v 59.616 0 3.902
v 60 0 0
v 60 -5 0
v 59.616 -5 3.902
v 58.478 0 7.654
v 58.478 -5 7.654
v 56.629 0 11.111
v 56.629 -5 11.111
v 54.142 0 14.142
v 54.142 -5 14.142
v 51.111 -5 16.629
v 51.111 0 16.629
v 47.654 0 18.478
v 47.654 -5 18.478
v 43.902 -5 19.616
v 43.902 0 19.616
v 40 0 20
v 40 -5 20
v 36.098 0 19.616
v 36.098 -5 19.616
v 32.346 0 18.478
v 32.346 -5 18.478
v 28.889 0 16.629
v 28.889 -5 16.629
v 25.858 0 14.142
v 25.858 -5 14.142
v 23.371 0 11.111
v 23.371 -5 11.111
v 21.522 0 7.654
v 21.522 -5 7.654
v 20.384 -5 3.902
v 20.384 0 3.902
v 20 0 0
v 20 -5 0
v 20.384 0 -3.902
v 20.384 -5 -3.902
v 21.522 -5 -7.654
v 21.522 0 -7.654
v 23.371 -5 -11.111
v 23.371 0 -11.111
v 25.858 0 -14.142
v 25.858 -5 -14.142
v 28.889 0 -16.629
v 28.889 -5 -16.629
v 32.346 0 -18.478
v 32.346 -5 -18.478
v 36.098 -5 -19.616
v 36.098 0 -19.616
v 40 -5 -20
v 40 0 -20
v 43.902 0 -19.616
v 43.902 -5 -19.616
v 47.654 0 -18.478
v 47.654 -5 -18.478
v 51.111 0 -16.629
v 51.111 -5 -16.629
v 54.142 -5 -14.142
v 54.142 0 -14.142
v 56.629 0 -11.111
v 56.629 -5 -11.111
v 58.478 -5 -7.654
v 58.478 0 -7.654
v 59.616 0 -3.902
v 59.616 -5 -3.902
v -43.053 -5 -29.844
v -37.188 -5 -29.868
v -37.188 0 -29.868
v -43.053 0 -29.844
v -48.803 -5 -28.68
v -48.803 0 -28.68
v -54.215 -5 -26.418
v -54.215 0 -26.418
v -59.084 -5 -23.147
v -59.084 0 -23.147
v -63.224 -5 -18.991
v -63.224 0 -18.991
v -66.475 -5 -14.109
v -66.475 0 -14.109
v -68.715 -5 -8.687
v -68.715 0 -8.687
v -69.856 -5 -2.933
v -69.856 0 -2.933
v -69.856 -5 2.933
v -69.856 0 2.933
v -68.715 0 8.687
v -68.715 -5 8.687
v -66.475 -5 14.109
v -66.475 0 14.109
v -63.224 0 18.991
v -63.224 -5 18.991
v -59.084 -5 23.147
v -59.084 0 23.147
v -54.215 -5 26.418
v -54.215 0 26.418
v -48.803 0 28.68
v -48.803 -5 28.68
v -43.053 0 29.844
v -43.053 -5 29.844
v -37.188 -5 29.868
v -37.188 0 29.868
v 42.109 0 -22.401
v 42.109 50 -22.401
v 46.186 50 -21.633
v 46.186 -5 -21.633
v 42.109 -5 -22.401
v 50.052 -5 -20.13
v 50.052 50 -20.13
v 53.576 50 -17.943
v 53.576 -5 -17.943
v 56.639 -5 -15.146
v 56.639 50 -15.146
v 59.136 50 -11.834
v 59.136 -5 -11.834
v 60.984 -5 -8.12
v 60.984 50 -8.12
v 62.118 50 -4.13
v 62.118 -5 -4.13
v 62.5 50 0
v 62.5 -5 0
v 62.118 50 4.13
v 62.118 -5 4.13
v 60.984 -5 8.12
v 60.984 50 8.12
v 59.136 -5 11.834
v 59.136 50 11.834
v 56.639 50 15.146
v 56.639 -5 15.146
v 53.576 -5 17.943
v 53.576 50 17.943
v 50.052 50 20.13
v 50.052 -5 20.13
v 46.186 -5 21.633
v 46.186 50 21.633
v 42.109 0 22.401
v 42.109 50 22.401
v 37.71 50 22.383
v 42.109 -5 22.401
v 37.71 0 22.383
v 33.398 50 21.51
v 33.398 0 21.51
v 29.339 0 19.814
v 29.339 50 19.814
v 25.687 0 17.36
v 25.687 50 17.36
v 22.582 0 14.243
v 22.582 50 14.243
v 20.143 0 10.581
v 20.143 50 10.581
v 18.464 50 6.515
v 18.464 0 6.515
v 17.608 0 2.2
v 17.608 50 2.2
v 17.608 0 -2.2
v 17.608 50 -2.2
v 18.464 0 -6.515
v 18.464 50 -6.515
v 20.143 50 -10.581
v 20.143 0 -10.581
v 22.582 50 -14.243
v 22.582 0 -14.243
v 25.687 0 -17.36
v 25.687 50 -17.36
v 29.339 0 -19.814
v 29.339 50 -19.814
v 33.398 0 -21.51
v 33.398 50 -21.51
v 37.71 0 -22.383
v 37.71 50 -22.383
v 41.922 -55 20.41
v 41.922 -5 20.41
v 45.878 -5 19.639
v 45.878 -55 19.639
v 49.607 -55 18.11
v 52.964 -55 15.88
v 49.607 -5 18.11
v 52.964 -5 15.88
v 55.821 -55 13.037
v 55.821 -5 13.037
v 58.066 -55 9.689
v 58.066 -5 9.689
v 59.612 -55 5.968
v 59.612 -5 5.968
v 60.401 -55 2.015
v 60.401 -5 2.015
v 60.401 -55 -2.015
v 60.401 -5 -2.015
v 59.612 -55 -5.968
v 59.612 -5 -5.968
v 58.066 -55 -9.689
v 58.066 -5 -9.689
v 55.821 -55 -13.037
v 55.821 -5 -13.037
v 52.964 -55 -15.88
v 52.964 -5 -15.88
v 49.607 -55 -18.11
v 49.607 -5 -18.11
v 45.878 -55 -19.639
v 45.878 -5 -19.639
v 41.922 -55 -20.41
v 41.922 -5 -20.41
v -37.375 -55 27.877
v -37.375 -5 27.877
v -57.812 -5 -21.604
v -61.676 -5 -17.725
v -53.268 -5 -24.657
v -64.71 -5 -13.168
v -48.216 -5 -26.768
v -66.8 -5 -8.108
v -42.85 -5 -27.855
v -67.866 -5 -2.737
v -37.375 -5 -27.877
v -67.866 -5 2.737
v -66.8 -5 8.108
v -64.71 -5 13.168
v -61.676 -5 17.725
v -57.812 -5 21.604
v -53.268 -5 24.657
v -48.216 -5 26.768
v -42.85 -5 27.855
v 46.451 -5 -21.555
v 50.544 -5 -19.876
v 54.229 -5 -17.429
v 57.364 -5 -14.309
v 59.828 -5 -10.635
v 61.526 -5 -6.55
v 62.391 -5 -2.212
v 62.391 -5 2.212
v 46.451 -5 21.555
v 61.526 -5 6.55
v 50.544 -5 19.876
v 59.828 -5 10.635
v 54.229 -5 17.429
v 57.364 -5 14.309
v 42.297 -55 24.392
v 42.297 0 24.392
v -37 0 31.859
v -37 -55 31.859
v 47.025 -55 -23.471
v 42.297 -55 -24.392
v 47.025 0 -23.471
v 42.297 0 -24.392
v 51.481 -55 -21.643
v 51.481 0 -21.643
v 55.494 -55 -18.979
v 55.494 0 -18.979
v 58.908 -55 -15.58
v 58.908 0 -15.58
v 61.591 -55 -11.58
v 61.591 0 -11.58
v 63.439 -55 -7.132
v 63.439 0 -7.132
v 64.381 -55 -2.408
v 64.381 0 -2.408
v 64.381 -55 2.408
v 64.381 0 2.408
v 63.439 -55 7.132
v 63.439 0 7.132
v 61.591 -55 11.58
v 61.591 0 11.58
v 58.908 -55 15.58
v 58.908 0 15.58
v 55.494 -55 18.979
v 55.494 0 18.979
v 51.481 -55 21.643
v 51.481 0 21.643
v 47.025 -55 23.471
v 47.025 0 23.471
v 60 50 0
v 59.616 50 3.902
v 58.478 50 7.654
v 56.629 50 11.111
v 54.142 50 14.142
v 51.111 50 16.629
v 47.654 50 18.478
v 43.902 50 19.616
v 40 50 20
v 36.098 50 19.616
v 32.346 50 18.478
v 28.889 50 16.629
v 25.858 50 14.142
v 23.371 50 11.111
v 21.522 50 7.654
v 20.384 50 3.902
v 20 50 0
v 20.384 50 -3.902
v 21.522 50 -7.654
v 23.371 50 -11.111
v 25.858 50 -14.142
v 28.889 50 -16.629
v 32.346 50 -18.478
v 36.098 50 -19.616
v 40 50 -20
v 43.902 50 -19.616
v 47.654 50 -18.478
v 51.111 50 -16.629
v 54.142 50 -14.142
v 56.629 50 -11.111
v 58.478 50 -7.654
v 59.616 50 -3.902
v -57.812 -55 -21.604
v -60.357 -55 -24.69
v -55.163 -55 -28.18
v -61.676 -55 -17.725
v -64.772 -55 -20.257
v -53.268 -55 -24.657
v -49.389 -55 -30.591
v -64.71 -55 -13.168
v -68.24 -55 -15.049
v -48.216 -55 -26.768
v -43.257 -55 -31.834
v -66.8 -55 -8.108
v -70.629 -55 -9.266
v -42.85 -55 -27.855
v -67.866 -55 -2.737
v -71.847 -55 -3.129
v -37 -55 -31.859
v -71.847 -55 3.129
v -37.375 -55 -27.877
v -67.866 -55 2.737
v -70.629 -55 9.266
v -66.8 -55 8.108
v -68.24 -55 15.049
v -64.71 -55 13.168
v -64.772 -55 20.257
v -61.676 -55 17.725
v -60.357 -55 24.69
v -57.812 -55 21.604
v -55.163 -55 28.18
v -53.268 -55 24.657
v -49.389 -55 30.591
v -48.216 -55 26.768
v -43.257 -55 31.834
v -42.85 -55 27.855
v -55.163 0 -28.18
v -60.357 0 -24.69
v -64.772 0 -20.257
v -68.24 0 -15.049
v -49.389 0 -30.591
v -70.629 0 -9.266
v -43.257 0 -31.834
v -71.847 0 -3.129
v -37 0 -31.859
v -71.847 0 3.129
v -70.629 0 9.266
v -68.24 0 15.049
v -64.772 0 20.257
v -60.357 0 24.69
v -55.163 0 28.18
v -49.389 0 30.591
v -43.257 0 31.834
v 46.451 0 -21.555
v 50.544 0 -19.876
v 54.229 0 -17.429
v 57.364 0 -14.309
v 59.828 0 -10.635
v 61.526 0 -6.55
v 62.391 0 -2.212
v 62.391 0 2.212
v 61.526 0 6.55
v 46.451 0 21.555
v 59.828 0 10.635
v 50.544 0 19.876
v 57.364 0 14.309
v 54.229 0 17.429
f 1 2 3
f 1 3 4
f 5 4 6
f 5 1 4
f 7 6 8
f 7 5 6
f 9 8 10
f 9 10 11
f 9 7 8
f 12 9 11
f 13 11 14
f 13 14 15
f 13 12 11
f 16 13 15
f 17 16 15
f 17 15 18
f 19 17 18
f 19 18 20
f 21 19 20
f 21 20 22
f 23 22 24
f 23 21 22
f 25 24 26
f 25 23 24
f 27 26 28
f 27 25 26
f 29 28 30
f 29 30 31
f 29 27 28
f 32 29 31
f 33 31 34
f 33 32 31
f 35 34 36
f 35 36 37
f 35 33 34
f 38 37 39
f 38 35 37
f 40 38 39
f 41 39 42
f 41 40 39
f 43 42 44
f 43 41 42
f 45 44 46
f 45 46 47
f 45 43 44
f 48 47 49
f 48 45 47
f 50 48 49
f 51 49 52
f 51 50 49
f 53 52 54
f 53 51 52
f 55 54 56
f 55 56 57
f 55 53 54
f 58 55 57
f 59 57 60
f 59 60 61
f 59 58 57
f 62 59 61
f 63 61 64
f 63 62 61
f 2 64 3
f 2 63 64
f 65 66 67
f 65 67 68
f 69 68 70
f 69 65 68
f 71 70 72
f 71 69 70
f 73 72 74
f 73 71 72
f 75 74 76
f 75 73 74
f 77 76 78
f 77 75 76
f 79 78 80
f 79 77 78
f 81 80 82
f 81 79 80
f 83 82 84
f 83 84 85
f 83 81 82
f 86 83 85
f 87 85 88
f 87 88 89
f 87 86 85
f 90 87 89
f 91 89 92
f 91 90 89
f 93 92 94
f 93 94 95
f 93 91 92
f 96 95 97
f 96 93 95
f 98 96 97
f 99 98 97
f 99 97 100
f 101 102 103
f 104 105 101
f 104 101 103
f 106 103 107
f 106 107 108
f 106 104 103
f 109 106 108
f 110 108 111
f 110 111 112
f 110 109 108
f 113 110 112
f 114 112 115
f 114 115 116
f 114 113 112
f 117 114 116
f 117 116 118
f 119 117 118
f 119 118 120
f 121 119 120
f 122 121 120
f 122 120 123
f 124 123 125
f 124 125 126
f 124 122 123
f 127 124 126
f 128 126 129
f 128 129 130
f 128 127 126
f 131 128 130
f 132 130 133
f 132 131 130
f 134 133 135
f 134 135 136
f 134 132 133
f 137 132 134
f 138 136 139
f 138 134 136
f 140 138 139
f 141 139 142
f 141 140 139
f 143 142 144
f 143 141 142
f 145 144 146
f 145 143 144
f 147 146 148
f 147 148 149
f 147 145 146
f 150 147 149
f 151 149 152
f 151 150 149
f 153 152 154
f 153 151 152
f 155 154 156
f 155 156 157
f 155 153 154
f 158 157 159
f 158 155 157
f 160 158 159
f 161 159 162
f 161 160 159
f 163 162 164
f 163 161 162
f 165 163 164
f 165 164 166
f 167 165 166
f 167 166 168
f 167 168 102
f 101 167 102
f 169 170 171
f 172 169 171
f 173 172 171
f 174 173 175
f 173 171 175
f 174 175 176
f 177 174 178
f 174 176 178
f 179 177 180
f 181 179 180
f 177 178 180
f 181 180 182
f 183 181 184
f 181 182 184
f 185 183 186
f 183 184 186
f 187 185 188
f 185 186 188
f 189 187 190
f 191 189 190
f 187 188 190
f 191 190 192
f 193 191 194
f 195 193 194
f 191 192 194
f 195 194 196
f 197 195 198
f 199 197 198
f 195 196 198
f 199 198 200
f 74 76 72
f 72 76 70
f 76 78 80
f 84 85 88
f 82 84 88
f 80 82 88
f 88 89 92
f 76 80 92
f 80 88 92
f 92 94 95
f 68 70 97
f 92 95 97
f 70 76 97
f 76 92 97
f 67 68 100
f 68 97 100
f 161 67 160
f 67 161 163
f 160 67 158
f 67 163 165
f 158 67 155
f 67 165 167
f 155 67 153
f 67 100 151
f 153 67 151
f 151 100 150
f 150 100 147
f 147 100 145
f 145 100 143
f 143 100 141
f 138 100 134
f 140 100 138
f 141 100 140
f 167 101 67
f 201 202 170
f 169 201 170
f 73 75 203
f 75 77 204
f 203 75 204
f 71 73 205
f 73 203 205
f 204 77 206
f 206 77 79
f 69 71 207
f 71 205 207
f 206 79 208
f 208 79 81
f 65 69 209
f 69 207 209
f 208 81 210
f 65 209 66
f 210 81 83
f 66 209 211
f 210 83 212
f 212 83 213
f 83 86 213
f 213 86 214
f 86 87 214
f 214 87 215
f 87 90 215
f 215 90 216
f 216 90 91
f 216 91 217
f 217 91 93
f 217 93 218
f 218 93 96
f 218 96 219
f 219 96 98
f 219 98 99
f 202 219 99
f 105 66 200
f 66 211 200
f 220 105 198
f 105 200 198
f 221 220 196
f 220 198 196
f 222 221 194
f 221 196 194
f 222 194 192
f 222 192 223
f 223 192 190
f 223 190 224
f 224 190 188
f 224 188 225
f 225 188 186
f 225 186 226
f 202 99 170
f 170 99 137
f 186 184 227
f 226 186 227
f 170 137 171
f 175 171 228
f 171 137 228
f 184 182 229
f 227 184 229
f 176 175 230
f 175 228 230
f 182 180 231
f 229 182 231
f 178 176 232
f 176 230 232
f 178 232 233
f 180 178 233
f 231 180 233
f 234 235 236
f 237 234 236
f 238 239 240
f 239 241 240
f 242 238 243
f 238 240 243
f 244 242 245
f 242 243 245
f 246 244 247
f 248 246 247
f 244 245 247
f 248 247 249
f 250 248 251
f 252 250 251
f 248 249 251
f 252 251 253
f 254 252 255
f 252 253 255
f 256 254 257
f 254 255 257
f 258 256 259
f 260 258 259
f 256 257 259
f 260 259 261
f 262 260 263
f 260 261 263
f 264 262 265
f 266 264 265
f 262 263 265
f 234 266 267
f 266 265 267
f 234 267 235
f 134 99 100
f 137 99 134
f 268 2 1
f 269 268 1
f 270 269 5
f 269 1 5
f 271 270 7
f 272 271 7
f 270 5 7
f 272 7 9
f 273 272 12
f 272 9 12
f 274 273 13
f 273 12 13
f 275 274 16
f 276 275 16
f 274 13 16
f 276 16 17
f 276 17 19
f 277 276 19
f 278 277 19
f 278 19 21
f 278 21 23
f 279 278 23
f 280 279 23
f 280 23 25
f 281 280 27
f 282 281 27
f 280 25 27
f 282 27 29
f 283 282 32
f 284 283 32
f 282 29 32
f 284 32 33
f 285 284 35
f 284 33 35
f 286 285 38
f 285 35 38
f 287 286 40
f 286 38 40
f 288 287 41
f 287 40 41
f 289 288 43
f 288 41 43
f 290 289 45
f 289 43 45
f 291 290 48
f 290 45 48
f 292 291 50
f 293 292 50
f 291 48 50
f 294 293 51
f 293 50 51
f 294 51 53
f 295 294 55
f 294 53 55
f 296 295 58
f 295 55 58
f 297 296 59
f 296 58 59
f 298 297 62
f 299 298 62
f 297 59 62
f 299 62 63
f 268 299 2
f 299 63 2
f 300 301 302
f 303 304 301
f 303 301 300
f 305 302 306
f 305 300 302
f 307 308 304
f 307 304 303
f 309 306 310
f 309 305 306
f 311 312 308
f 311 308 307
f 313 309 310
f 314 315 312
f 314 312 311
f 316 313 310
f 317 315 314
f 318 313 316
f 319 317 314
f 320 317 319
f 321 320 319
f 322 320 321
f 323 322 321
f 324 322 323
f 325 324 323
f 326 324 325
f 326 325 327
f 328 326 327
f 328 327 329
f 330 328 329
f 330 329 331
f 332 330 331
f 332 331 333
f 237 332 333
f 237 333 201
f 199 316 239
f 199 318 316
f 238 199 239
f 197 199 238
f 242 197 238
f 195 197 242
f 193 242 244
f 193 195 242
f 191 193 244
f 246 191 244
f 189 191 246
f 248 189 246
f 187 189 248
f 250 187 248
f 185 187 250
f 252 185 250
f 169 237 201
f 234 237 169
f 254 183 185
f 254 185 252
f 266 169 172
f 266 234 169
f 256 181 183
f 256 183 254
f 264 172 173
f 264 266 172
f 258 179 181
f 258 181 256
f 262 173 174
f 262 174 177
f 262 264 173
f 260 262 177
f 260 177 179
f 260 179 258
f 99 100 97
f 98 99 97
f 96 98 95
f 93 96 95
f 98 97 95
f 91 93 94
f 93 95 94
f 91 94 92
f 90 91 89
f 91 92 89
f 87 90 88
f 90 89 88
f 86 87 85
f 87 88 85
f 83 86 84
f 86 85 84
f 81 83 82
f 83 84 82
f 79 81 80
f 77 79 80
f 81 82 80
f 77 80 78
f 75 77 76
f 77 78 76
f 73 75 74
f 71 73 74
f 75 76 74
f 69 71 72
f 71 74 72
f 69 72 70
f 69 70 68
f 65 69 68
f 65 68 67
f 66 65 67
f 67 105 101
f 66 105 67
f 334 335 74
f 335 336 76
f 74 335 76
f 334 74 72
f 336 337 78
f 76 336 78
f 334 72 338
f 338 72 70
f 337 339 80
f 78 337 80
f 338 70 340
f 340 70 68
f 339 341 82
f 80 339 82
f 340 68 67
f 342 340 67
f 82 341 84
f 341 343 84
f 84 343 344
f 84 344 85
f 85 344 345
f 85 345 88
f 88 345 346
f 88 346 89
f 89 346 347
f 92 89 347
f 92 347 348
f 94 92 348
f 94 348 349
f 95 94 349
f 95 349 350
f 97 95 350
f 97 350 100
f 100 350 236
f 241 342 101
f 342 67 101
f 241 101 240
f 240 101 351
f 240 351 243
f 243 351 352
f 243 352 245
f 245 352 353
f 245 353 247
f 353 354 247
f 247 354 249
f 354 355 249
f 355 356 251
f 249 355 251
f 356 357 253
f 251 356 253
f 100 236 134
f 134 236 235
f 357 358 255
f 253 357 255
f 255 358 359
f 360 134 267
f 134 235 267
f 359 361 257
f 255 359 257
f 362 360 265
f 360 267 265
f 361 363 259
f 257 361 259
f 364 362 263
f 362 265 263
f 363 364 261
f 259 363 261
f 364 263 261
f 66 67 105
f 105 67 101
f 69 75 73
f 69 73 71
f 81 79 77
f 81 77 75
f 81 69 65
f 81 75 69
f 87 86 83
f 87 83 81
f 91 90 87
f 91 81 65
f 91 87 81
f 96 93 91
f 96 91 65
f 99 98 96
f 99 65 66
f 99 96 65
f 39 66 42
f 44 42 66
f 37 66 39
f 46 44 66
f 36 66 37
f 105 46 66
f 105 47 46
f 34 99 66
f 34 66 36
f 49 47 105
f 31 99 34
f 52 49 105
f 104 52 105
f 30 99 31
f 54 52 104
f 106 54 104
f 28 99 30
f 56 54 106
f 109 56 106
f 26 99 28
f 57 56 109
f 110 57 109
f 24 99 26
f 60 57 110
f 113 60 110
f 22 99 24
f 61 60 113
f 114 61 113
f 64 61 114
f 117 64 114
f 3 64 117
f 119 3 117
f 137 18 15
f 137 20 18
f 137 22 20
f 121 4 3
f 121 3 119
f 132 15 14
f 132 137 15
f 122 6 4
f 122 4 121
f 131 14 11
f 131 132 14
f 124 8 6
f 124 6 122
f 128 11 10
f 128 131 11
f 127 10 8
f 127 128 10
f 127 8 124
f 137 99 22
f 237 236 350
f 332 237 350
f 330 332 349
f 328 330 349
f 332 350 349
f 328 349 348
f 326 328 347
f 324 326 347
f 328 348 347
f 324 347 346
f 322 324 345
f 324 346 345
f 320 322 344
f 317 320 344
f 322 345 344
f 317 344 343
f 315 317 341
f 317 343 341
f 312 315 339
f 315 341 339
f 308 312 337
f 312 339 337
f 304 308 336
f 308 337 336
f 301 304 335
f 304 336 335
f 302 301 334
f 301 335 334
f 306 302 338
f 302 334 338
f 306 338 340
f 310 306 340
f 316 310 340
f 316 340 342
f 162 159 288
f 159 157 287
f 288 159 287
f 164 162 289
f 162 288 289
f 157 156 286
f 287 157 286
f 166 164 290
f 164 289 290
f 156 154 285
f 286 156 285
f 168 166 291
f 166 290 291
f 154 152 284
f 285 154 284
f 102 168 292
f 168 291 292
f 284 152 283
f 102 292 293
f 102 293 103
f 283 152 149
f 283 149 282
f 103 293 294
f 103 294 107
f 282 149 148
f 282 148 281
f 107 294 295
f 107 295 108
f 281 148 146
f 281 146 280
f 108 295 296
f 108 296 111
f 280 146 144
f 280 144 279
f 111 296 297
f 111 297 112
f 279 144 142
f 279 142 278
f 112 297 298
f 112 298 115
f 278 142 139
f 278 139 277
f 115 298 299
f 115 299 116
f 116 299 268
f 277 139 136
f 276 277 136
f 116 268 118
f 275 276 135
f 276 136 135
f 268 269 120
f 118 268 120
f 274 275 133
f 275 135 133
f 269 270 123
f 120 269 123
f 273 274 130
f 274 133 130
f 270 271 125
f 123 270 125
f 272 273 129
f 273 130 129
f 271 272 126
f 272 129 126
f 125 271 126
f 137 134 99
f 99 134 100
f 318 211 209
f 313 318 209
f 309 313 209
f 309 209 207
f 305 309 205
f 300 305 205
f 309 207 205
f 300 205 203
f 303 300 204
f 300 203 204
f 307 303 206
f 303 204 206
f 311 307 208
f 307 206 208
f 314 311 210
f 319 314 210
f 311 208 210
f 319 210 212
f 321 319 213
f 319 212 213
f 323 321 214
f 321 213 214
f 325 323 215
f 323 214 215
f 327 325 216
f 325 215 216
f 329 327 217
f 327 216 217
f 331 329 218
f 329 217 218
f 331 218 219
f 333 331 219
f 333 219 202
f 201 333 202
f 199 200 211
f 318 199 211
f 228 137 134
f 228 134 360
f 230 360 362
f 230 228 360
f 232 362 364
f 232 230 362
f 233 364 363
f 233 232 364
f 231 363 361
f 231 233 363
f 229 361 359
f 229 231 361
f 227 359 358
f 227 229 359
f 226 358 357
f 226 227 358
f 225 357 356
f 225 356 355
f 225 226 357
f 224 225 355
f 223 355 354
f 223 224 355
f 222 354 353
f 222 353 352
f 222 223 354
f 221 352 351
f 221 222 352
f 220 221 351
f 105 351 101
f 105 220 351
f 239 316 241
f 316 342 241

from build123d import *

# Parameters (mm, degrees)
F0_R     = 20
F1_DEPTH = 5
F2_DEPTH = 50
F4_DEPTH = 5
F5_DEPTH = 50


with BuildPart() as f1:
    # F0 (on Front) → F1 (new body)
    with BuildSketch(Plane.XZ):
        with BuildLine():
            ThreePointArc((-10, 0), (-17.8147008134, 20.1943680268), (-37.1875, 29.8678731039))
            ThreePointArc((-37.1875, 29.8678731039), (-70, 0), (-37.1875, -29.8678731039))
            ThreePointArc((-37.1875, -29.8678731039), (-17.8147008134, -20.1943680268), (-10, 0))
        make_face()
        with BuildLine():
            ThreePointArc((42.109375, -22.4009048279), (17.5, 0), (42.109375, 22.4009048279))
            Line((42.109375, 22.4009048279), (-37.1875, 29.8678731039))
            ThreePointArc((-37.1875, 29.8678731039), (-17.8147008134, 20.1943680268), (-10, 0))
            ThreePointArc((-10, 0), (-17.8147008134, -20.1943680268), (-37.1875, -29.8678731039))
            Line((-37.1875, -29.8678731039), (42.109375, -22.4009048279))
        make_face()
        with BuildLine():
            ThreePointArc((42.109375, -22.4009048279), (56.63897439, -15.1457760201), (62.5, 0))
            ThreePointArc((62.5, 0), (56.63897439, 15.1457760201), (42.109375, 22.4009048279))
            ThreePointArc((42.109375, 22.4009048279), (17.5, 0), (42.109375, -22.4009048279))
        make_face()
        with Locations((40, 0)):
            Circle(F0_R, mode=Mode.SUBTRACT)
    extrude(amount=F1_DEPTH)

    # F0 (on Front) → F2 (join)
    with BuildSketch(Plane.XZ):
        with BuildLine():
            ThreePointArc((42.109375, -22.4009048279), (56.63897439, -15.1457760201), (62.5, 0))
            ThreePointArc((62.5, 0), (56.63897439, 15.1457760201), (42.109375, 22.4009048279))
            ThreePointArc((42.109375, 22.4009048279), (17.5, 0), (42.109375, -22.4009048279))
        make_face()
        with Locations((40, 0)):
            Circle(F0_R, mode=Mode.SUBTRACT)
    extrude(amount=-F2_DEPTH)


with BuildPart() as f4:
    # F3 (on face) → F4 (new body)
    with BuildSketch(Plane.XZ.offset(5)):
        with BuildLine():
            ThreePointArc((-37, 31.8590646441), (-72, 0), (-37, -31.8590646441))
            Line((-37, -31.8590646441), (42.296875, -24.3920963682))
            ThreePointArc((42.296875, -24.3920963682), (64.5, 0), (42.296875, 24.3920963682))
            Line((42.296875, 24.3920963682), (-37, 31.8590646441))
        make_face()
        with BuildLine():
            ThreePointArc((-37.1875, -29.8678731039), (-70, 0), (-37.1875, 29.8678731039))
            Line((-37.1875, 29.8678731039), (42.109375, 22.4009048279))
            ThreePointArc((42.109375, 22.4009048279), (62.5, 0), (42.109375, -22.4009048279))
            Line((42.109375, -22.4009048279), (-37.1875, -29.8678731039))
        make_face(mode=Mode.SUBTRACT)
    extrude(amount=-F4_DEPTH)

    # F3 (on face) → F5 (join)
    with BuildSketch(Plane.XZ.offset(5)):
        with BuildLine():
            ThreePointArc((-37, 31.8590646441), (-72, 0), (-37, -31.8590646441))
            Line((-37, -31.8590646441), (42.296875, -24.3920963682))
            ThreePointArc((42.296875, -24.3920963682), (64.5, 0), (42.296875, 24.3920963682))
            Line((42.296875, 24.3920963682), (-37, 31.8590646441))
        make_face()
        with BuildLine():
            ThreePointArc((-37.1875, -29.8678731039), (-70, 0), (-37.1875, 29.8678731039))
            Line((-37.1875, 29.8678731039), (42.109375, 22.4009048279))
            ThreePointArc((42.109375, 22.4009048279), (62.5, 0), (42.109375, -22.4009048279))
            Line((42.109375, -22.4009048279), (-37.1875, -29.8678731039))
        make_face(mode=Mode.SUBTRACT)
        with BuildLine():
            Line((42.109375, 22.4009048279), (-37.1875, 29.8678731039))
            ThreePointArc((-37.1875, 29.8678731039), (-70, 0), (-37.1875, -29.8678731039))
            Line((-37.1875, -29.8678731039), (42.109375, -22.4009048279))
            ThreePointArc((42.109375, -22.4009048279), (62.5, 0), (42.109375, 22.4009048279))
        make_face()
        with BuildLine():
            ThreePointArc((-37.375, -27.8766815636), (-68, 0), (-37.375, 27.8766815636))
            Line((-37.375, 27.8766815636), (41.921875, 20.4097132877))
            ThreePointArc((41.921875, 20.4097132877), (60.5, 0), (41.921875, -20.4097132877))
            Line((41.921875, -20.4097132877), (-37.375, -27.8766815636))
        make_face(mode=Mode.SUBTRACT)
    extrude(amount=F5_DEPTH)


solid = Compound([f1.part, f4.part])
